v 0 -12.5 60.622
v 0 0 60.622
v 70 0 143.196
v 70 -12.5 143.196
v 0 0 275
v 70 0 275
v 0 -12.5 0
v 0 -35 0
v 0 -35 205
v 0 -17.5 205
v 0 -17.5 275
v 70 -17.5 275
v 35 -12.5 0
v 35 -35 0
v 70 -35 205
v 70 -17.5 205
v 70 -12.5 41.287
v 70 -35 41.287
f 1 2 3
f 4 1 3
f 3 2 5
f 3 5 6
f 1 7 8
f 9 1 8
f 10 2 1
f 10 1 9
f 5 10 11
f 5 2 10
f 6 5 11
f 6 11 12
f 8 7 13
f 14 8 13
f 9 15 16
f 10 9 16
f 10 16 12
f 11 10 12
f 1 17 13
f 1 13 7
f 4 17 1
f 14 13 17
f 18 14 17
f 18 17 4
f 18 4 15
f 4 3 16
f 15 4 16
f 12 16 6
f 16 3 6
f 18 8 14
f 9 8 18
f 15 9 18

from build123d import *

# Parameters (mm, degrees)
F0_W     = 70
F0_H     = 275
F1_DEPTH = 35
F2_W     = 17.5
F2_H     = 70
F3_DEPTH = 70.001
F5_DEPTH = 12.5
F6_DEPTH = 35.001


with BuildPart() as f1:
    # F0 (on Front) → F1 (new body)
    with BuildSketch(Plane.XZ):
        with Locations((35, 137.5)):
            Rectangle(F0_W, F0_H)
    extrude(amount=F1_DEPTH)

    # F2 (on face) → F3 (cut, through all)
    with BuildSketch(Plane.YZ.offset(70)):
        with Locations((-26.25, 240)):
            Rectangle(F2_W, F2_H)
    extrude(amount=-F3_DEPTH, mode=Mode.SUBTRACT)

    # F4 (on face) → F5 (cut, symmetric)
    with BuildSketch(Plane(origin=(0, 0, 0), x_dir=(-1, 0, 0), z_dir=(0, 1, 0))):
        Polygon((-70, 143.1957509073), (-70, 41.2869863212), (-35, 0), (0, 0), (0, 60.6217782649), align=None)
    extrude(amount=F5_DEPTH, both=True, mode=Mode.SUBTRACT)

    # F6 (cut, through all): a face of the model
    f6_faces = [f1.faces().sort_by_distance(p)[0] for p in [
        (58.3333333333, 0, 13.7623287737),
    ]]
    extrude(f6_faces, amount=-F6_DEPTH, mode=Mode.SUBTRACT)


solid = f1.part
